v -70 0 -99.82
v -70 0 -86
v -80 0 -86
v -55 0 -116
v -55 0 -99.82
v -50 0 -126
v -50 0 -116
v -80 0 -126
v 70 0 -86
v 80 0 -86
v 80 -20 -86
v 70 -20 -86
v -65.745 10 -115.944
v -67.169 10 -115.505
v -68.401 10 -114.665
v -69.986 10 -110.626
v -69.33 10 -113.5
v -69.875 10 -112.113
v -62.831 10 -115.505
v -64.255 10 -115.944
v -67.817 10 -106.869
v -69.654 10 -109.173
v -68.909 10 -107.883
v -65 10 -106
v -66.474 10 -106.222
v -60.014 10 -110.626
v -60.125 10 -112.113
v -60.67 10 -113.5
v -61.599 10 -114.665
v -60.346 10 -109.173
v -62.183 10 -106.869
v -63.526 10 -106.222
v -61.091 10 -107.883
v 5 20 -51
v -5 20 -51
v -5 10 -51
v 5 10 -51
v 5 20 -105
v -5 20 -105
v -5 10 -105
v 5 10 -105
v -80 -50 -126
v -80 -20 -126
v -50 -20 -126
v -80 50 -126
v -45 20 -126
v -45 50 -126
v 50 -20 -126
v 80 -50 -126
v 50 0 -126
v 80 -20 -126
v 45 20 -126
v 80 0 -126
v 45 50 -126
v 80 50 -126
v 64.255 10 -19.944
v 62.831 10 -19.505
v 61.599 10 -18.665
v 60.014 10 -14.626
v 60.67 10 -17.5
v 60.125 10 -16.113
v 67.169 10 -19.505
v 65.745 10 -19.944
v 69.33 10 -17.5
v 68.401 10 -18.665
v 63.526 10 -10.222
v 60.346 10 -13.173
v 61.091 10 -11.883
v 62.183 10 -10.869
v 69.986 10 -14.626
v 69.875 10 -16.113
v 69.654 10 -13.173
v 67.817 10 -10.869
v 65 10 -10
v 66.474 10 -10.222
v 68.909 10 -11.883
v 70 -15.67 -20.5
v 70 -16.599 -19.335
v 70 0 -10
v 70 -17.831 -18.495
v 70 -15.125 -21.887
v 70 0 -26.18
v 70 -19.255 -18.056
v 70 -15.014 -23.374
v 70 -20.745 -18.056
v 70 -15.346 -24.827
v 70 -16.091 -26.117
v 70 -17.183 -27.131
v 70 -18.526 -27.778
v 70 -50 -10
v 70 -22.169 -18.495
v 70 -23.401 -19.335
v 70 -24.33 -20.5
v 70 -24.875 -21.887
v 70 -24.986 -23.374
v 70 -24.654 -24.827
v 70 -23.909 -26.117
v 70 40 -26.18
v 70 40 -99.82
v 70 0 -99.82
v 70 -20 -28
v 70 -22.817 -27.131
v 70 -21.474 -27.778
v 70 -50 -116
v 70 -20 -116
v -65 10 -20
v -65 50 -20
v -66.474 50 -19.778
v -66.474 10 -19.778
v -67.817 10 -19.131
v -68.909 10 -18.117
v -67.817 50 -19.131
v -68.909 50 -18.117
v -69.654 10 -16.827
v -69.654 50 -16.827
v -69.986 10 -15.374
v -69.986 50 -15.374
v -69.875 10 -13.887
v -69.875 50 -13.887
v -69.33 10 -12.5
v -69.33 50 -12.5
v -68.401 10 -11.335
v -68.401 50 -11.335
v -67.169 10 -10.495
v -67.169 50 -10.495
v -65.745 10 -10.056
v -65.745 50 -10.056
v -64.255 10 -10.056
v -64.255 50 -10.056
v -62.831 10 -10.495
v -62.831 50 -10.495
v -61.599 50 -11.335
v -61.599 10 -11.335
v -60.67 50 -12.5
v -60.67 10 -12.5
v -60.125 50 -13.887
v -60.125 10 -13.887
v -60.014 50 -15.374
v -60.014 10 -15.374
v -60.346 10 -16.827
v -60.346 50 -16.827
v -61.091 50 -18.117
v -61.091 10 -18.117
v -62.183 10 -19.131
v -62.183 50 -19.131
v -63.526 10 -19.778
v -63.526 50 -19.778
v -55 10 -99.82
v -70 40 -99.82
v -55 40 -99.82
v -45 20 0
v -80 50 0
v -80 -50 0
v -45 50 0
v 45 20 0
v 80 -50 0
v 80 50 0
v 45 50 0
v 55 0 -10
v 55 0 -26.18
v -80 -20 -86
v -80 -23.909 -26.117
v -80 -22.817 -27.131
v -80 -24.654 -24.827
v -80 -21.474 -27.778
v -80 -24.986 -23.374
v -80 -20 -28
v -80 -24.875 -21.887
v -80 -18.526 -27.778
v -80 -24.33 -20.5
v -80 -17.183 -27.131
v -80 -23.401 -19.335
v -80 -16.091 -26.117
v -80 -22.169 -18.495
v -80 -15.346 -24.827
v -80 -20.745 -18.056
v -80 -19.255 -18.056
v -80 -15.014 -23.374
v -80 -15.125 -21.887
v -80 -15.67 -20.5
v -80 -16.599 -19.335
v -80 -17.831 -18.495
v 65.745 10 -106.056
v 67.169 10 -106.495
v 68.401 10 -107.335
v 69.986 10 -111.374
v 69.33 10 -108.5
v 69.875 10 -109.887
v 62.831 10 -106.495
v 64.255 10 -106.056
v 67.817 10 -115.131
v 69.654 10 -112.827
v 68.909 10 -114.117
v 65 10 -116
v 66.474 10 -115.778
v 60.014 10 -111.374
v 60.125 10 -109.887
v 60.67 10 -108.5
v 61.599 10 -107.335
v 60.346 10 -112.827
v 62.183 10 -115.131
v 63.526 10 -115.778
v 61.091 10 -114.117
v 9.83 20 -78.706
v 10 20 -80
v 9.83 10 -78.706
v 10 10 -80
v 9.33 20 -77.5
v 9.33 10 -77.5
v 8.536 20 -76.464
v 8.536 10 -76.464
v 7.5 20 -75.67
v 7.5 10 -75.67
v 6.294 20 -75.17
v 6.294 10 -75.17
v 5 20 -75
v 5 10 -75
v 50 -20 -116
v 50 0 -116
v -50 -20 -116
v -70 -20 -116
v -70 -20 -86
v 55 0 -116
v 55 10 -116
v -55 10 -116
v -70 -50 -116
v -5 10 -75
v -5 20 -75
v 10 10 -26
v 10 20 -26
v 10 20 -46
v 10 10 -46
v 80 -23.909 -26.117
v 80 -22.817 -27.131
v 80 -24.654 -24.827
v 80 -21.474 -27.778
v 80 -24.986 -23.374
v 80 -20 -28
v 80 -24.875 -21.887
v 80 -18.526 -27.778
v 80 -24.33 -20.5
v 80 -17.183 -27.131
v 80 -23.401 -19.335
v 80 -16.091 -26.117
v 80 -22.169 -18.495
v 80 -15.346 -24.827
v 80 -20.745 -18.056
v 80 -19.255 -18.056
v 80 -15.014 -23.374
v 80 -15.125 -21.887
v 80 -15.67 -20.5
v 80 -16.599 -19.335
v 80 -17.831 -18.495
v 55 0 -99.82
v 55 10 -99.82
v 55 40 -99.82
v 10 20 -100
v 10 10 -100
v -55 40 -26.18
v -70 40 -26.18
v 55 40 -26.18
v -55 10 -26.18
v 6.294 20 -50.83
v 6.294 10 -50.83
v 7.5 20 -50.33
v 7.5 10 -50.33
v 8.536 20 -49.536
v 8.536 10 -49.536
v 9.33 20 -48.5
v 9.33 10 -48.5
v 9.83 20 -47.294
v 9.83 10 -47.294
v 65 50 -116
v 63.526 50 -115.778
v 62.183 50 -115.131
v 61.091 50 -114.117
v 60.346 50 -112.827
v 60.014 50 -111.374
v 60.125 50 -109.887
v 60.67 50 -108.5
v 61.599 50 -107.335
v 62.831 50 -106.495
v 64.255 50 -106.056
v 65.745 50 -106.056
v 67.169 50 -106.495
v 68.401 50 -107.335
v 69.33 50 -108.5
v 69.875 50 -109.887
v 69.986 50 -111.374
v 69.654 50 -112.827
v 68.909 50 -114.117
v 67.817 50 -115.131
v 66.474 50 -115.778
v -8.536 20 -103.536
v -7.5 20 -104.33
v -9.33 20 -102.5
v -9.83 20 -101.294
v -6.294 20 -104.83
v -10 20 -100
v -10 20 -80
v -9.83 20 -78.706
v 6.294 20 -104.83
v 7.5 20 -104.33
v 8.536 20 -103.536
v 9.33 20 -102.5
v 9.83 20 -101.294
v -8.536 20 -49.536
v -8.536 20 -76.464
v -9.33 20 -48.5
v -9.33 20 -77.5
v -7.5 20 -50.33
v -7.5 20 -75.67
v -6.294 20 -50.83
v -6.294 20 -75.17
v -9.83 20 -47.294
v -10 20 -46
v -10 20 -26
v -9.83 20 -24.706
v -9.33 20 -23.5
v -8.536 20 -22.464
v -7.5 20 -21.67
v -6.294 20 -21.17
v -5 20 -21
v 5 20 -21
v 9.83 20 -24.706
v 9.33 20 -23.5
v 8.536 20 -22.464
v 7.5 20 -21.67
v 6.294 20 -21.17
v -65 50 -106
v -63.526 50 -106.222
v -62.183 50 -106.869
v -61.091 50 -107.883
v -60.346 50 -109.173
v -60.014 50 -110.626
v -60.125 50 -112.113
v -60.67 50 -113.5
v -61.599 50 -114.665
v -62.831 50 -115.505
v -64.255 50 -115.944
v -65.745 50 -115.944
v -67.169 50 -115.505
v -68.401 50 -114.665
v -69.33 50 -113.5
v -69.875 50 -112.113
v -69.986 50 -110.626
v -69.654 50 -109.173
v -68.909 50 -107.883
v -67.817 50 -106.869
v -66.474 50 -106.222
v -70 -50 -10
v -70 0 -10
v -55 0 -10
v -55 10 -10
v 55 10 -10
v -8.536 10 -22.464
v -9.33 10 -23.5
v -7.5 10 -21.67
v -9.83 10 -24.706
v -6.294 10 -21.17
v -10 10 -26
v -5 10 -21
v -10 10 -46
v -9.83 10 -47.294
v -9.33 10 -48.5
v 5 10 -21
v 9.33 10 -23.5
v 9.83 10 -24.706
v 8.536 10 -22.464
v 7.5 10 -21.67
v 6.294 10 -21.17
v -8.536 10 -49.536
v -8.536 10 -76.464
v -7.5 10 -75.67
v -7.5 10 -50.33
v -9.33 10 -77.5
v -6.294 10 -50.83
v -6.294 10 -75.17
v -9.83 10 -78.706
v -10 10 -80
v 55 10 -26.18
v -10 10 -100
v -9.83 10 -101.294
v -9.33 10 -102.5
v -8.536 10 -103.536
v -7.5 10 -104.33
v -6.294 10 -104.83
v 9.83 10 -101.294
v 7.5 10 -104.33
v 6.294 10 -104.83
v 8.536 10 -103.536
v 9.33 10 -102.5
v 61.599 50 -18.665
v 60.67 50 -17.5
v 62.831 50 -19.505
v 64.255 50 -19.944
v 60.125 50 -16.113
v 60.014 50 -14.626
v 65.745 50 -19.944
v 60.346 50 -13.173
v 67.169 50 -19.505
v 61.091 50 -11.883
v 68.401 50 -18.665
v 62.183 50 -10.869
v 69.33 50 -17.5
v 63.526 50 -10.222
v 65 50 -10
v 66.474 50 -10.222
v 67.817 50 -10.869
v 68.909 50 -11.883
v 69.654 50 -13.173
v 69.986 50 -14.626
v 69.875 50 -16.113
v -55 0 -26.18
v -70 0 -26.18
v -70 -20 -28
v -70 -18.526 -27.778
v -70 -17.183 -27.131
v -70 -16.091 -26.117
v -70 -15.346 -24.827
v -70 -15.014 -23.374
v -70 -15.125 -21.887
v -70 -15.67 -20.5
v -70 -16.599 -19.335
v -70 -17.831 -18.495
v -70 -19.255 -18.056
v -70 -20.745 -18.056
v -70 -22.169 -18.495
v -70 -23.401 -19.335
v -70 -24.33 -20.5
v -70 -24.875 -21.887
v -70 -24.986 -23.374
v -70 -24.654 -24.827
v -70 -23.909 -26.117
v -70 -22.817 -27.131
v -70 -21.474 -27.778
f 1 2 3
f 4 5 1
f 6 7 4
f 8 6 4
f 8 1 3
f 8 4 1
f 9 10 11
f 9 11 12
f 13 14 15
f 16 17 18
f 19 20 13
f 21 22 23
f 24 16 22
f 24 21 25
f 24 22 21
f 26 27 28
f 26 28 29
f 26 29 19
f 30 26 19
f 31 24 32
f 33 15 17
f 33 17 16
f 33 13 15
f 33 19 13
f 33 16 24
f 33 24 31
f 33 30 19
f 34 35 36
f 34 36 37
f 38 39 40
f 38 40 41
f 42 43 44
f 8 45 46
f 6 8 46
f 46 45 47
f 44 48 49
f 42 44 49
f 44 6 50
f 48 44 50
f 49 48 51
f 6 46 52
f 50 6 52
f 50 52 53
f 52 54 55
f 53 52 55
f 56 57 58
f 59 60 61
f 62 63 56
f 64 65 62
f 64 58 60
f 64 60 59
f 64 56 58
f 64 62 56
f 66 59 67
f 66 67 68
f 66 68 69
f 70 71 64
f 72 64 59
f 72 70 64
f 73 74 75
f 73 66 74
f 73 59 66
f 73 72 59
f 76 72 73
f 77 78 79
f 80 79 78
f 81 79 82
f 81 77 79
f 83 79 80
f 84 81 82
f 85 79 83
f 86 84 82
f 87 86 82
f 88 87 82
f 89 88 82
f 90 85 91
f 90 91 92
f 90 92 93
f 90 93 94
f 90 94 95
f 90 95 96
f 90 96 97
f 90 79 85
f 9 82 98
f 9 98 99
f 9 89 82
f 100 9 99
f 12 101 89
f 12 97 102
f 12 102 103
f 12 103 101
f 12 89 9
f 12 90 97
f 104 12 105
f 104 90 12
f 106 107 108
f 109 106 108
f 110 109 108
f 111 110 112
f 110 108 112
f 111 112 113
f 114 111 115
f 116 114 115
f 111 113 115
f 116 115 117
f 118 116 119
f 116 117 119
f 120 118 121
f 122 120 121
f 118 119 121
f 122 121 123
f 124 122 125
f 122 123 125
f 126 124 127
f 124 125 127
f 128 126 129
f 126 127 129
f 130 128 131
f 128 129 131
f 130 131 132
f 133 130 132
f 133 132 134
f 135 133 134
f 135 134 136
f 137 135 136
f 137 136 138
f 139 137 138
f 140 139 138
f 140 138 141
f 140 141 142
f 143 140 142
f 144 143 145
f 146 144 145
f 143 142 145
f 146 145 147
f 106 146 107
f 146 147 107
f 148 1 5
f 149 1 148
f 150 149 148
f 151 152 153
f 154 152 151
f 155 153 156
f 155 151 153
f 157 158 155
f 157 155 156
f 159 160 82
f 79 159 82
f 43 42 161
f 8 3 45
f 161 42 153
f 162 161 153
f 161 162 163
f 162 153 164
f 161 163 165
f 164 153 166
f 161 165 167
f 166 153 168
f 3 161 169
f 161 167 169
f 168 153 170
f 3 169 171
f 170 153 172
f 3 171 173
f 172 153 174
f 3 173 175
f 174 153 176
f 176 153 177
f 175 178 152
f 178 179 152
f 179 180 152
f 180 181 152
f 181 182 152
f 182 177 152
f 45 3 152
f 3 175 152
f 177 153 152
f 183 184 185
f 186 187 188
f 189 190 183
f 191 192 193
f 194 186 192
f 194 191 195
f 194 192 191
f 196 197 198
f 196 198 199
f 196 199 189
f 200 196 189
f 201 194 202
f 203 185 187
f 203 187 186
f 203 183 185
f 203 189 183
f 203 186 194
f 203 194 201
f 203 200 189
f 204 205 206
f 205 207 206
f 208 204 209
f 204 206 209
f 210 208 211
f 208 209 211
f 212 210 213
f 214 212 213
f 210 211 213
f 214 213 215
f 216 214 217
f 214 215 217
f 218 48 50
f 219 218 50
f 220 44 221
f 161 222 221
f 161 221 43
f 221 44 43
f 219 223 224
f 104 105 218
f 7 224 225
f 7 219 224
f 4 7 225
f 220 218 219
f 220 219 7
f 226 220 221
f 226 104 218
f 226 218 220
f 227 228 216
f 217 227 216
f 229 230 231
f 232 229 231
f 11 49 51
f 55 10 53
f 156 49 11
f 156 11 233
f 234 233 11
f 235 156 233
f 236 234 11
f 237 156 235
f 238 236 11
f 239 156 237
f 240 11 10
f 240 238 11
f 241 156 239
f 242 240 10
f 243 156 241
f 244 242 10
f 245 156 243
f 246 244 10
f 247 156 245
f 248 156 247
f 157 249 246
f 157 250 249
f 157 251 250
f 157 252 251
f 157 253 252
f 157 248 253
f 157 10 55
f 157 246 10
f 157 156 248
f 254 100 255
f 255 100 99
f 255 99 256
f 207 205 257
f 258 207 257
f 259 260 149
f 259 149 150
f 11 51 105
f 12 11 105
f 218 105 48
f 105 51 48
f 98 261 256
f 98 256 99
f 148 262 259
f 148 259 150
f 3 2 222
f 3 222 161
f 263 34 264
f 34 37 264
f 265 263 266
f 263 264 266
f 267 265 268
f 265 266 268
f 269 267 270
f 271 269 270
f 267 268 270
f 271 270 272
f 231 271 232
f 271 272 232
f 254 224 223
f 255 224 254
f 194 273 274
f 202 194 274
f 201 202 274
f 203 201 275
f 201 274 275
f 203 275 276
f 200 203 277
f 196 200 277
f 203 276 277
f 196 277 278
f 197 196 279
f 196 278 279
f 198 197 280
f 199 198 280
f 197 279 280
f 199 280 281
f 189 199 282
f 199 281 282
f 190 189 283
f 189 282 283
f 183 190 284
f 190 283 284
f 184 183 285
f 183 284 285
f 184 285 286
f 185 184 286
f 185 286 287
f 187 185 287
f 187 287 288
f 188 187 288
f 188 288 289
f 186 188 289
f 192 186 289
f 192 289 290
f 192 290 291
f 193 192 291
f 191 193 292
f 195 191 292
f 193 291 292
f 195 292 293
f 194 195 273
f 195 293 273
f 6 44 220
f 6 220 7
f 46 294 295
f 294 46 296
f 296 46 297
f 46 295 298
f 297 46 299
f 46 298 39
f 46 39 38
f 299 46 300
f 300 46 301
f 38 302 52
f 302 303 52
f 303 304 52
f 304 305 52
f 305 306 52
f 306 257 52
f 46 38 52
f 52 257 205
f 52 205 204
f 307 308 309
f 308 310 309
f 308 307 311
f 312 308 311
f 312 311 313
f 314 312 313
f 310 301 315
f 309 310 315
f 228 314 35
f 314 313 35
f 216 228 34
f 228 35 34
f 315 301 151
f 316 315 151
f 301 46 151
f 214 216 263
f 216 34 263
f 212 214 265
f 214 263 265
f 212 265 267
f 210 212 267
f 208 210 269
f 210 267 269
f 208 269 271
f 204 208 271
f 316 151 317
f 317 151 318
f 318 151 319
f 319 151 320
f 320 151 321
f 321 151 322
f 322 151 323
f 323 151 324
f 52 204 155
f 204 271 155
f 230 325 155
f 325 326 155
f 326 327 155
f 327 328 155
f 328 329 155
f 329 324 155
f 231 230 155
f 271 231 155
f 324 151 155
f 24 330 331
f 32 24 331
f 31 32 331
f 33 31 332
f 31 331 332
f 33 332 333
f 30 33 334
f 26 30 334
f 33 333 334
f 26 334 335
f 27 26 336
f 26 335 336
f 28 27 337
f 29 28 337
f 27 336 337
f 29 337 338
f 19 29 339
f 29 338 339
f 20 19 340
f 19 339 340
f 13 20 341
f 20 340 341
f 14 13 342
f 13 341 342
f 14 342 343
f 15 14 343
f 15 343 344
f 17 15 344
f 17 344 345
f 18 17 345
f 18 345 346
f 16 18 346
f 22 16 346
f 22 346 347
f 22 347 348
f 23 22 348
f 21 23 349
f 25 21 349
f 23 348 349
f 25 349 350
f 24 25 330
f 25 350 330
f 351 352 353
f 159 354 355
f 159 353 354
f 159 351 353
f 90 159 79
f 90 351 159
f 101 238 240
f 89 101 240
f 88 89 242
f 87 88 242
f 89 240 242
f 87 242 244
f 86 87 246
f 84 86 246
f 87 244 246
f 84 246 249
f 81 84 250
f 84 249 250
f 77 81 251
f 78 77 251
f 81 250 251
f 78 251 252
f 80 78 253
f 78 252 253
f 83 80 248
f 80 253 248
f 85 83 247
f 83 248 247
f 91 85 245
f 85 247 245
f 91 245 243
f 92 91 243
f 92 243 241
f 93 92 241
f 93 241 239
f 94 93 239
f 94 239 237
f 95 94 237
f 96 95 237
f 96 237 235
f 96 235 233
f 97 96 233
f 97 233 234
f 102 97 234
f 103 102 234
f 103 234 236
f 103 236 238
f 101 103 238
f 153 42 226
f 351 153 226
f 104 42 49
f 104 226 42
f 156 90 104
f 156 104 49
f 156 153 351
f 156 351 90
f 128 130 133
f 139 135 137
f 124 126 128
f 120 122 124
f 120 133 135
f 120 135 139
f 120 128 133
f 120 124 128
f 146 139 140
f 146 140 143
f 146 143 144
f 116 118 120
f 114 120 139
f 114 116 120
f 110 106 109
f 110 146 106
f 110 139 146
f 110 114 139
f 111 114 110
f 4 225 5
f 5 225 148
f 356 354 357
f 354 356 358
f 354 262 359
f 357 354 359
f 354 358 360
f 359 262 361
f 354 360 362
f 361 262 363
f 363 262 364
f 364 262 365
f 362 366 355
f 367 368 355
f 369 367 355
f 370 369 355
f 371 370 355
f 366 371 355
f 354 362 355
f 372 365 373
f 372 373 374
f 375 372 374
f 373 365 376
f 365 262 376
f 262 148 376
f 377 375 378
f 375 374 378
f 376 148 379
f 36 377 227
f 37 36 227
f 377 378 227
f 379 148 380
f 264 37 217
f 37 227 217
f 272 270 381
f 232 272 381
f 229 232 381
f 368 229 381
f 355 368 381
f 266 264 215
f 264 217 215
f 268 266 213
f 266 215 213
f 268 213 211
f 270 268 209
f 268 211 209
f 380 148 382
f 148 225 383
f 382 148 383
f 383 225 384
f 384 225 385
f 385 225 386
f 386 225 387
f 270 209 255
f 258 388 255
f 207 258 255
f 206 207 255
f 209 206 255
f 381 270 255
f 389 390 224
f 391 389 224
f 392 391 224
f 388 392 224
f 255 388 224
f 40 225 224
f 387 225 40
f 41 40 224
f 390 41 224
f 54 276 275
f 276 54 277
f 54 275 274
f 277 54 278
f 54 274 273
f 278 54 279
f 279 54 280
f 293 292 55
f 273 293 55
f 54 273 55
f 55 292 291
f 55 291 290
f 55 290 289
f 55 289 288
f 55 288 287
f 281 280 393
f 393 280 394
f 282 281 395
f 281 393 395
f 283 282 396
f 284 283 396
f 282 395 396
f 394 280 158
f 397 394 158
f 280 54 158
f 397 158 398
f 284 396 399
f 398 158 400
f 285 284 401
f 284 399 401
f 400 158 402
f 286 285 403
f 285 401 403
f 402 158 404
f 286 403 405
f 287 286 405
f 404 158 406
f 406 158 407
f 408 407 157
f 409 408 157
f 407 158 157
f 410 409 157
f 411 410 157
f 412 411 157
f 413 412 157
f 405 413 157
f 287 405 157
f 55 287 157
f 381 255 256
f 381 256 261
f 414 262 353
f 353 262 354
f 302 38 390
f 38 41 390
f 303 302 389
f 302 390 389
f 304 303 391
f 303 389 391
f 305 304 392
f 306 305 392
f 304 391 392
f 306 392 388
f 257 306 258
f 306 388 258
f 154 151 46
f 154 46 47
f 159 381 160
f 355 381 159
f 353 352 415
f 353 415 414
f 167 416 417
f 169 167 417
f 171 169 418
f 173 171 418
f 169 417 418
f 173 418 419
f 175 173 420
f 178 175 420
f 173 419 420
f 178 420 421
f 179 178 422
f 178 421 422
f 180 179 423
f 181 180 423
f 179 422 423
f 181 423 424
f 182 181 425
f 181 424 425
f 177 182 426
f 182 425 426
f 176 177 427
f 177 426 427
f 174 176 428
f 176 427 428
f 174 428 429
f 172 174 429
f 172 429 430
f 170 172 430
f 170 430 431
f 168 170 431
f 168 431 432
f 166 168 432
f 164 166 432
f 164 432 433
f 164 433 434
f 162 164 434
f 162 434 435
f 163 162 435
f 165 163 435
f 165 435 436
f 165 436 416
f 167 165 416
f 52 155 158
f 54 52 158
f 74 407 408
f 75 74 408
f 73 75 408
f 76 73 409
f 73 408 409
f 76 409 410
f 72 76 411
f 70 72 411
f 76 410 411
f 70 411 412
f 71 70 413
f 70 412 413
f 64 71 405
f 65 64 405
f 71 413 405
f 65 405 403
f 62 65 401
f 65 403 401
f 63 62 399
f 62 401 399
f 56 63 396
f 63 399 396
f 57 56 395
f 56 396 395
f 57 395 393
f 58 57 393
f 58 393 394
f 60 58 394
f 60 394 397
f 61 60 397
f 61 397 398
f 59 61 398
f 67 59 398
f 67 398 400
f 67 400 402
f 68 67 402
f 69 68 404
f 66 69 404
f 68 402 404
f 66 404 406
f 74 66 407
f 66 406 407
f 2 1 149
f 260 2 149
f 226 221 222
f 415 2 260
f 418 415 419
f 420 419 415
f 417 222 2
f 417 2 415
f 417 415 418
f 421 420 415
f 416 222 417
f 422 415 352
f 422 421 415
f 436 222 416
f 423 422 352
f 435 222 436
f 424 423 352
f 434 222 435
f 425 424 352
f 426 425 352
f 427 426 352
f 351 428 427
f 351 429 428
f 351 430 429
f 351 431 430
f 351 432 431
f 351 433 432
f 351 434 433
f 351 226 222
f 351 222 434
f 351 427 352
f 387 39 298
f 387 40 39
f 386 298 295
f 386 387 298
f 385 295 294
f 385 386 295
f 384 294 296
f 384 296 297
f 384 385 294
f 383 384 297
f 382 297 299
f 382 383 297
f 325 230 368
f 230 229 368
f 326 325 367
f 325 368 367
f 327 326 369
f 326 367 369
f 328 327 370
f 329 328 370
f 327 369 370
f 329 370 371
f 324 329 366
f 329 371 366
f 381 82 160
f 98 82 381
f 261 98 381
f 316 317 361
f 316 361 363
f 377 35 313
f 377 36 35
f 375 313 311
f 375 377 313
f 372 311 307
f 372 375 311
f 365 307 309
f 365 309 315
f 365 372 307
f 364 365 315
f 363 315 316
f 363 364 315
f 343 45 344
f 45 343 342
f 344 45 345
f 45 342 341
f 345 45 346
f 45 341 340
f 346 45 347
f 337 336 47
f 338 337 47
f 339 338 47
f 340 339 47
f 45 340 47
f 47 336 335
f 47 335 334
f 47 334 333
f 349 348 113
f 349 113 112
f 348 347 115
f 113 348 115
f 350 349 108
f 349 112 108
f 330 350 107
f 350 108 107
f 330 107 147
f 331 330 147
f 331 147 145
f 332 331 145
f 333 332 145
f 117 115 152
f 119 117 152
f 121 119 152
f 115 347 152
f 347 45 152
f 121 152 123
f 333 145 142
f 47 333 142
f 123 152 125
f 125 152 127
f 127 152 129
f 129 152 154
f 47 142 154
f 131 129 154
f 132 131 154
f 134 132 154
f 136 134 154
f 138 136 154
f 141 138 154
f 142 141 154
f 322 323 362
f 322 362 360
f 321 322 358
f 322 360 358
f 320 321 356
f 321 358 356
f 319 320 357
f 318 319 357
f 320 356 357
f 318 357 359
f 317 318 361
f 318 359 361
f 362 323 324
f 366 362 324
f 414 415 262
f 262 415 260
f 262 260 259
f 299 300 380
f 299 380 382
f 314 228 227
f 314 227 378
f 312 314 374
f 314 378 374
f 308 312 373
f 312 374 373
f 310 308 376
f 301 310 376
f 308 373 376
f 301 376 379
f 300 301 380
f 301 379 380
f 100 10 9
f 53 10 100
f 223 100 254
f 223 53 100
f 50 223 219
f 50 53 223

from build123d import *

# Parameters (mm, degrees)
SKETCH1_W           = 160
SKETCH1_H           = 100
BOSS_EXTRUDE1_DEPTH = 126
SKETCH2_W           = 90
SKETCH2_H           = 60
CUT_EXTRUDE1_DEPTH  = 126
SKETCH3_R           = 5
CUT_EXTRUDE2_DEPTH  = 40
SHELL1_START        = -50
SHELL1_DEPTH        = 60
SHELL1_2_DEPTH      = 50
SHELL1_START_2      = 10
SHELL1_3_DEPTH      = 30
SKETCH4_W           = 20
SKETCH4_H           = 30
CUT_EXTRUDE3_DEPTH  = 180.655225362
FILLET1_R           = 5
SKETCH5_W           = 30
SKETCH5_H           = 20
CUT_EXTRUDE4_DEPTH  = 40
SKETCH6_W           = 110
SKETCH6_H           = 106
CUT_EXTRUDE5_DEPTH  = 10
SKETCH7_W           = 15
SKETCH7_H           = 73.639320226
CUT_EXTRUDE6_DEPTH  = 40
SKETCH8_R           = 5
CUT_EXTRUDE7_DEPTH  = 210.704554075


# Read off the part's stored shape, not the designer's step: Shell1
with BuildPart() as part:
    # Sketch1 → Boss-Extrude1 (new body)
    with BuildSketch(Plane.XY):
        Rectangle(SKETCH1_W, SKETCH1_H)
    extrude(amount=-BOSS_EXTRUDE1_DEPTH)

    # Sketch2 → Cut-Extrude1 (cut)
    with BuildSketch(Plane.XY):
        with Locations((0, 50)):
            Rectangle(SKETCH2_W, SKETCH2_H)
    extrude(amount=-CUT_EXTRUDE1_DEPTH, mode=Mode.SUBTRACT)

    # Sketch3 → Cut-Extrude2 (cut)
    with BuildSketch(Plane(origin=(0, 50, 0), x_dir=(1, 0, 0), z_dir=(0, 1, 0))):
        with Locations(Location((-65, 111, 0), (0, 0, 270))):
            Circle(SKETCH3_R)
        with Locations(Location((65, 111, 0), (0, 0, 90))):
            Circle(SKETCH3_R)
        with Locations(Location((65, 15, 0), (0, 0, 270))):
            Circle(SKETCH3_R)
        with Locations(Location((-65, 15, 0), (0, 0, 90))):
            Circle(SKETCH3_R)
    extrude(amount=-CUT_EXTRUDE2_DEPTH, mode=Mode.SUBTRACT)

    # Shell1 outline → Shell1 (cut)
    with BuildSketch(Plane(origin=(0, 0, 0), x_dir=(1, 0, 0), z_dir=(0, 1, 0)).offset(SHELL1_START)):
        with BuildLine():
            Line((70, 29.142135624), (70, 96.857864376))
            ThreePointArc((70, 96.857864376), (54.393398282, 100.393398282), (50.857864376, 116))
            Line((50.857864376, 116), (-50.857864376, 116))
            ThreePointArc((-50.857864376, 116), (-54.393398282, 100.393398282), (-70, 96.857864376))
            Line((-70, 96.857864376), (-70, 29.142135624))
            ThreePointArc((-70, 29.142135624), (-54.393398282, 25.606601718), (-50.857864376, 10))
            Line((-50.857864376, 10), (50.857864376, 10))
            ThreePointArc((50.857864376, 10), (54.393398282, 25.606601718), (70, 29.142135624))
        make_face()
    extrude(amount=SHELL1_DEPTH, mode=Mode.SUBTRACT)

    # Shell1 2 outline → Shell1 2 (cut)
    with BuildSketch(Plane(origin=(0, 0, 0), x_dir=(1, 0, 0), z_dir=(0, 1, 0)).offset(SHELL1_START)):
        with BuildLine():
            Line((50.857864376, 10), (70, 10))
            Line((70, 10), (70, 29.142135624))
            ThreePointArc((70, 29.142135624), (54.393398282, 25.606601718), (50.857864376, 10))
        make_face()
        with BuildLine():
            ThreePointArc((50.857864376, 116), (54.393398282, 100.393398282), (70, 96.857864376))
            Line((70, 96.857864376), (70, 116))
            Line((70, 116), (50.857864376, 116))
        make_face()
        with BuildLine():
            Line((-70, 10), (-50.857864376, 10))
            ThreePointArc((-50.857864376, 10), (-54.393398282, 25.606601718), (-70, 29.142135624))
            Line((-70, 29.142135624), (-70, 10))
        make_face()
        with BuildLine():
            ThreePointArc((-70, 96.857864376), (-54.393398282, 100.393398282), (-50.857864376, 116))
            Line((-50.857864376, 116), (-70, 116))
            Line((-70, 116), (-70, 96.857864376))
        make_face()
    extrude(amount=SHELL1_2_DEPTH, mode=Mode.SUBTRACT)

    # Shell1 3 outline → Shell1 3 (cut)
    with BuildSketch(Plane(origin=(0, 0, 0), x_dir=(1, 0, 0), z_dir=(0, 1, 0)).offset(SHELL1_START_2)):
        with BuildLine():
            ThreePointArc((55, 26.180339887), (62.094305849, 29.715873794), (70, 29.142135624))
            Line((70, 29.142135624), (70, 96.857864376))
            ThreePointArc((70, 96.857864376), (62.094305849, 96.284126206), (55, 99.819660113))
            Line((55, 99.819660113), (55, 26.180339887))
        make_face()
        with BuildLine():
            ThreePointArc((-70, 29.142135624), (-62.094305849, 29.715873794), (-55, 26.180339887))
            Line((-55, 26.180339887), (-55, 99.819660113))
            ThreePointArc((-55, 99.819660113), (-62.094305849, 96.284126206), (-70, 96.857864376))
            Line((-70, 96.857864376), (-70, 29.142135624))
        make_face()
    extrude(amount=SHELL1_3_DEPTH, mode=Mode.SUBTRACT)

    # Sketch4 → Cut-Extrude3 (cut, through all)
    with BuildSketch(Plane(origin=(0, 50, 0), x_dir=(1, 0, 0), z_dir=(0, 1, 0))):
        with Locations((0, 90)):
            Rectangle(SKETCH4_W, SKETCH4_H)
        with Locations((0, 36)):
            Rectangle(SKETCH4_W, SKETCH4_H)
    extrude(amount=-CUT_EXTRUDE3_DEPTH, mode=Mode.SUBTRACT)

    # Fillet1
    fillet1_edges = [part.edges().sort_by_distance(p)[0] for p in [
        (-10, 15, -21),
        (-10, 15, -51),
        (10, 15, -51),
        (10, 15, -21),
        (10, 15, -105),
        (10, 15, -75),
        (-10, 15, -75),
        (-10, 15, -105),
    ]]
    fillet(fillet1_edges, radius=FILLET1_R)

    # Sketch5 → Cut-Extrude4 (cut)
    with BuildSketch(Plane(origin=(0, 0, -126), x_dir=(-1, 0, 0), z_dir=(0, 0, -1))):
        with Locations((-65, -10)):
            Rectangle(SKETCH5_W, SKETCH5_H)
        with Locations((65, -10)):
            Rectangle(SKETCH5_W, SKETCH5_H)
    extrude(amount=-CUT_EXTRUDE4_DEPTH, mode=Mode.SUBTRACT)

    # Sketch6 → Cut-Extrude5 (cut)
    with BuildSketch(Plane.XZ.offset(-10)):
        with Locations((0, -63)):
            Rectangle(SKETCH6_W, SKETCH6_H)
    extrude(amount=CUT_EXTRUDE5_DEPTH, mode=Mode.SUBTRACT)

    # Sketch7 → Cut-Extrude6 (cut)
    with BuildSketch(Plane.XZ.offset(-40)):
        with Locations((-62.5, -63)):
            Rectangle(SKETCH7_W, SKETCH7_H)
    cut_extrude6 = extrude(amount=CUT_EXTRUDE6_DEPTH, mode=Mode.SUBTRACT)

    # Mirror1: Cut-Extrude6 across plane
    add(cut_extrude6.mirror(Plane(origin=(0, 0, 0), x_dir=(0, 0, 1), z_dir=(1, 0, 0))), mode=Mode.SUBTRACT)

    # Sketch8 → Cut-Extrude7 (cut, through all)
    with BuildSketch(Plane(origin=(80, 0, 0), x_dir=(0, 0, -1), z_dir=(1, 0, 0))):
        with Locations((23, -20)):
            Circle(SKETCH8_R)
    extrude(amount=-CUT_EXTRUDE7_DEPTH, mode=Mode.SUBTRACT)


solid = part.part
